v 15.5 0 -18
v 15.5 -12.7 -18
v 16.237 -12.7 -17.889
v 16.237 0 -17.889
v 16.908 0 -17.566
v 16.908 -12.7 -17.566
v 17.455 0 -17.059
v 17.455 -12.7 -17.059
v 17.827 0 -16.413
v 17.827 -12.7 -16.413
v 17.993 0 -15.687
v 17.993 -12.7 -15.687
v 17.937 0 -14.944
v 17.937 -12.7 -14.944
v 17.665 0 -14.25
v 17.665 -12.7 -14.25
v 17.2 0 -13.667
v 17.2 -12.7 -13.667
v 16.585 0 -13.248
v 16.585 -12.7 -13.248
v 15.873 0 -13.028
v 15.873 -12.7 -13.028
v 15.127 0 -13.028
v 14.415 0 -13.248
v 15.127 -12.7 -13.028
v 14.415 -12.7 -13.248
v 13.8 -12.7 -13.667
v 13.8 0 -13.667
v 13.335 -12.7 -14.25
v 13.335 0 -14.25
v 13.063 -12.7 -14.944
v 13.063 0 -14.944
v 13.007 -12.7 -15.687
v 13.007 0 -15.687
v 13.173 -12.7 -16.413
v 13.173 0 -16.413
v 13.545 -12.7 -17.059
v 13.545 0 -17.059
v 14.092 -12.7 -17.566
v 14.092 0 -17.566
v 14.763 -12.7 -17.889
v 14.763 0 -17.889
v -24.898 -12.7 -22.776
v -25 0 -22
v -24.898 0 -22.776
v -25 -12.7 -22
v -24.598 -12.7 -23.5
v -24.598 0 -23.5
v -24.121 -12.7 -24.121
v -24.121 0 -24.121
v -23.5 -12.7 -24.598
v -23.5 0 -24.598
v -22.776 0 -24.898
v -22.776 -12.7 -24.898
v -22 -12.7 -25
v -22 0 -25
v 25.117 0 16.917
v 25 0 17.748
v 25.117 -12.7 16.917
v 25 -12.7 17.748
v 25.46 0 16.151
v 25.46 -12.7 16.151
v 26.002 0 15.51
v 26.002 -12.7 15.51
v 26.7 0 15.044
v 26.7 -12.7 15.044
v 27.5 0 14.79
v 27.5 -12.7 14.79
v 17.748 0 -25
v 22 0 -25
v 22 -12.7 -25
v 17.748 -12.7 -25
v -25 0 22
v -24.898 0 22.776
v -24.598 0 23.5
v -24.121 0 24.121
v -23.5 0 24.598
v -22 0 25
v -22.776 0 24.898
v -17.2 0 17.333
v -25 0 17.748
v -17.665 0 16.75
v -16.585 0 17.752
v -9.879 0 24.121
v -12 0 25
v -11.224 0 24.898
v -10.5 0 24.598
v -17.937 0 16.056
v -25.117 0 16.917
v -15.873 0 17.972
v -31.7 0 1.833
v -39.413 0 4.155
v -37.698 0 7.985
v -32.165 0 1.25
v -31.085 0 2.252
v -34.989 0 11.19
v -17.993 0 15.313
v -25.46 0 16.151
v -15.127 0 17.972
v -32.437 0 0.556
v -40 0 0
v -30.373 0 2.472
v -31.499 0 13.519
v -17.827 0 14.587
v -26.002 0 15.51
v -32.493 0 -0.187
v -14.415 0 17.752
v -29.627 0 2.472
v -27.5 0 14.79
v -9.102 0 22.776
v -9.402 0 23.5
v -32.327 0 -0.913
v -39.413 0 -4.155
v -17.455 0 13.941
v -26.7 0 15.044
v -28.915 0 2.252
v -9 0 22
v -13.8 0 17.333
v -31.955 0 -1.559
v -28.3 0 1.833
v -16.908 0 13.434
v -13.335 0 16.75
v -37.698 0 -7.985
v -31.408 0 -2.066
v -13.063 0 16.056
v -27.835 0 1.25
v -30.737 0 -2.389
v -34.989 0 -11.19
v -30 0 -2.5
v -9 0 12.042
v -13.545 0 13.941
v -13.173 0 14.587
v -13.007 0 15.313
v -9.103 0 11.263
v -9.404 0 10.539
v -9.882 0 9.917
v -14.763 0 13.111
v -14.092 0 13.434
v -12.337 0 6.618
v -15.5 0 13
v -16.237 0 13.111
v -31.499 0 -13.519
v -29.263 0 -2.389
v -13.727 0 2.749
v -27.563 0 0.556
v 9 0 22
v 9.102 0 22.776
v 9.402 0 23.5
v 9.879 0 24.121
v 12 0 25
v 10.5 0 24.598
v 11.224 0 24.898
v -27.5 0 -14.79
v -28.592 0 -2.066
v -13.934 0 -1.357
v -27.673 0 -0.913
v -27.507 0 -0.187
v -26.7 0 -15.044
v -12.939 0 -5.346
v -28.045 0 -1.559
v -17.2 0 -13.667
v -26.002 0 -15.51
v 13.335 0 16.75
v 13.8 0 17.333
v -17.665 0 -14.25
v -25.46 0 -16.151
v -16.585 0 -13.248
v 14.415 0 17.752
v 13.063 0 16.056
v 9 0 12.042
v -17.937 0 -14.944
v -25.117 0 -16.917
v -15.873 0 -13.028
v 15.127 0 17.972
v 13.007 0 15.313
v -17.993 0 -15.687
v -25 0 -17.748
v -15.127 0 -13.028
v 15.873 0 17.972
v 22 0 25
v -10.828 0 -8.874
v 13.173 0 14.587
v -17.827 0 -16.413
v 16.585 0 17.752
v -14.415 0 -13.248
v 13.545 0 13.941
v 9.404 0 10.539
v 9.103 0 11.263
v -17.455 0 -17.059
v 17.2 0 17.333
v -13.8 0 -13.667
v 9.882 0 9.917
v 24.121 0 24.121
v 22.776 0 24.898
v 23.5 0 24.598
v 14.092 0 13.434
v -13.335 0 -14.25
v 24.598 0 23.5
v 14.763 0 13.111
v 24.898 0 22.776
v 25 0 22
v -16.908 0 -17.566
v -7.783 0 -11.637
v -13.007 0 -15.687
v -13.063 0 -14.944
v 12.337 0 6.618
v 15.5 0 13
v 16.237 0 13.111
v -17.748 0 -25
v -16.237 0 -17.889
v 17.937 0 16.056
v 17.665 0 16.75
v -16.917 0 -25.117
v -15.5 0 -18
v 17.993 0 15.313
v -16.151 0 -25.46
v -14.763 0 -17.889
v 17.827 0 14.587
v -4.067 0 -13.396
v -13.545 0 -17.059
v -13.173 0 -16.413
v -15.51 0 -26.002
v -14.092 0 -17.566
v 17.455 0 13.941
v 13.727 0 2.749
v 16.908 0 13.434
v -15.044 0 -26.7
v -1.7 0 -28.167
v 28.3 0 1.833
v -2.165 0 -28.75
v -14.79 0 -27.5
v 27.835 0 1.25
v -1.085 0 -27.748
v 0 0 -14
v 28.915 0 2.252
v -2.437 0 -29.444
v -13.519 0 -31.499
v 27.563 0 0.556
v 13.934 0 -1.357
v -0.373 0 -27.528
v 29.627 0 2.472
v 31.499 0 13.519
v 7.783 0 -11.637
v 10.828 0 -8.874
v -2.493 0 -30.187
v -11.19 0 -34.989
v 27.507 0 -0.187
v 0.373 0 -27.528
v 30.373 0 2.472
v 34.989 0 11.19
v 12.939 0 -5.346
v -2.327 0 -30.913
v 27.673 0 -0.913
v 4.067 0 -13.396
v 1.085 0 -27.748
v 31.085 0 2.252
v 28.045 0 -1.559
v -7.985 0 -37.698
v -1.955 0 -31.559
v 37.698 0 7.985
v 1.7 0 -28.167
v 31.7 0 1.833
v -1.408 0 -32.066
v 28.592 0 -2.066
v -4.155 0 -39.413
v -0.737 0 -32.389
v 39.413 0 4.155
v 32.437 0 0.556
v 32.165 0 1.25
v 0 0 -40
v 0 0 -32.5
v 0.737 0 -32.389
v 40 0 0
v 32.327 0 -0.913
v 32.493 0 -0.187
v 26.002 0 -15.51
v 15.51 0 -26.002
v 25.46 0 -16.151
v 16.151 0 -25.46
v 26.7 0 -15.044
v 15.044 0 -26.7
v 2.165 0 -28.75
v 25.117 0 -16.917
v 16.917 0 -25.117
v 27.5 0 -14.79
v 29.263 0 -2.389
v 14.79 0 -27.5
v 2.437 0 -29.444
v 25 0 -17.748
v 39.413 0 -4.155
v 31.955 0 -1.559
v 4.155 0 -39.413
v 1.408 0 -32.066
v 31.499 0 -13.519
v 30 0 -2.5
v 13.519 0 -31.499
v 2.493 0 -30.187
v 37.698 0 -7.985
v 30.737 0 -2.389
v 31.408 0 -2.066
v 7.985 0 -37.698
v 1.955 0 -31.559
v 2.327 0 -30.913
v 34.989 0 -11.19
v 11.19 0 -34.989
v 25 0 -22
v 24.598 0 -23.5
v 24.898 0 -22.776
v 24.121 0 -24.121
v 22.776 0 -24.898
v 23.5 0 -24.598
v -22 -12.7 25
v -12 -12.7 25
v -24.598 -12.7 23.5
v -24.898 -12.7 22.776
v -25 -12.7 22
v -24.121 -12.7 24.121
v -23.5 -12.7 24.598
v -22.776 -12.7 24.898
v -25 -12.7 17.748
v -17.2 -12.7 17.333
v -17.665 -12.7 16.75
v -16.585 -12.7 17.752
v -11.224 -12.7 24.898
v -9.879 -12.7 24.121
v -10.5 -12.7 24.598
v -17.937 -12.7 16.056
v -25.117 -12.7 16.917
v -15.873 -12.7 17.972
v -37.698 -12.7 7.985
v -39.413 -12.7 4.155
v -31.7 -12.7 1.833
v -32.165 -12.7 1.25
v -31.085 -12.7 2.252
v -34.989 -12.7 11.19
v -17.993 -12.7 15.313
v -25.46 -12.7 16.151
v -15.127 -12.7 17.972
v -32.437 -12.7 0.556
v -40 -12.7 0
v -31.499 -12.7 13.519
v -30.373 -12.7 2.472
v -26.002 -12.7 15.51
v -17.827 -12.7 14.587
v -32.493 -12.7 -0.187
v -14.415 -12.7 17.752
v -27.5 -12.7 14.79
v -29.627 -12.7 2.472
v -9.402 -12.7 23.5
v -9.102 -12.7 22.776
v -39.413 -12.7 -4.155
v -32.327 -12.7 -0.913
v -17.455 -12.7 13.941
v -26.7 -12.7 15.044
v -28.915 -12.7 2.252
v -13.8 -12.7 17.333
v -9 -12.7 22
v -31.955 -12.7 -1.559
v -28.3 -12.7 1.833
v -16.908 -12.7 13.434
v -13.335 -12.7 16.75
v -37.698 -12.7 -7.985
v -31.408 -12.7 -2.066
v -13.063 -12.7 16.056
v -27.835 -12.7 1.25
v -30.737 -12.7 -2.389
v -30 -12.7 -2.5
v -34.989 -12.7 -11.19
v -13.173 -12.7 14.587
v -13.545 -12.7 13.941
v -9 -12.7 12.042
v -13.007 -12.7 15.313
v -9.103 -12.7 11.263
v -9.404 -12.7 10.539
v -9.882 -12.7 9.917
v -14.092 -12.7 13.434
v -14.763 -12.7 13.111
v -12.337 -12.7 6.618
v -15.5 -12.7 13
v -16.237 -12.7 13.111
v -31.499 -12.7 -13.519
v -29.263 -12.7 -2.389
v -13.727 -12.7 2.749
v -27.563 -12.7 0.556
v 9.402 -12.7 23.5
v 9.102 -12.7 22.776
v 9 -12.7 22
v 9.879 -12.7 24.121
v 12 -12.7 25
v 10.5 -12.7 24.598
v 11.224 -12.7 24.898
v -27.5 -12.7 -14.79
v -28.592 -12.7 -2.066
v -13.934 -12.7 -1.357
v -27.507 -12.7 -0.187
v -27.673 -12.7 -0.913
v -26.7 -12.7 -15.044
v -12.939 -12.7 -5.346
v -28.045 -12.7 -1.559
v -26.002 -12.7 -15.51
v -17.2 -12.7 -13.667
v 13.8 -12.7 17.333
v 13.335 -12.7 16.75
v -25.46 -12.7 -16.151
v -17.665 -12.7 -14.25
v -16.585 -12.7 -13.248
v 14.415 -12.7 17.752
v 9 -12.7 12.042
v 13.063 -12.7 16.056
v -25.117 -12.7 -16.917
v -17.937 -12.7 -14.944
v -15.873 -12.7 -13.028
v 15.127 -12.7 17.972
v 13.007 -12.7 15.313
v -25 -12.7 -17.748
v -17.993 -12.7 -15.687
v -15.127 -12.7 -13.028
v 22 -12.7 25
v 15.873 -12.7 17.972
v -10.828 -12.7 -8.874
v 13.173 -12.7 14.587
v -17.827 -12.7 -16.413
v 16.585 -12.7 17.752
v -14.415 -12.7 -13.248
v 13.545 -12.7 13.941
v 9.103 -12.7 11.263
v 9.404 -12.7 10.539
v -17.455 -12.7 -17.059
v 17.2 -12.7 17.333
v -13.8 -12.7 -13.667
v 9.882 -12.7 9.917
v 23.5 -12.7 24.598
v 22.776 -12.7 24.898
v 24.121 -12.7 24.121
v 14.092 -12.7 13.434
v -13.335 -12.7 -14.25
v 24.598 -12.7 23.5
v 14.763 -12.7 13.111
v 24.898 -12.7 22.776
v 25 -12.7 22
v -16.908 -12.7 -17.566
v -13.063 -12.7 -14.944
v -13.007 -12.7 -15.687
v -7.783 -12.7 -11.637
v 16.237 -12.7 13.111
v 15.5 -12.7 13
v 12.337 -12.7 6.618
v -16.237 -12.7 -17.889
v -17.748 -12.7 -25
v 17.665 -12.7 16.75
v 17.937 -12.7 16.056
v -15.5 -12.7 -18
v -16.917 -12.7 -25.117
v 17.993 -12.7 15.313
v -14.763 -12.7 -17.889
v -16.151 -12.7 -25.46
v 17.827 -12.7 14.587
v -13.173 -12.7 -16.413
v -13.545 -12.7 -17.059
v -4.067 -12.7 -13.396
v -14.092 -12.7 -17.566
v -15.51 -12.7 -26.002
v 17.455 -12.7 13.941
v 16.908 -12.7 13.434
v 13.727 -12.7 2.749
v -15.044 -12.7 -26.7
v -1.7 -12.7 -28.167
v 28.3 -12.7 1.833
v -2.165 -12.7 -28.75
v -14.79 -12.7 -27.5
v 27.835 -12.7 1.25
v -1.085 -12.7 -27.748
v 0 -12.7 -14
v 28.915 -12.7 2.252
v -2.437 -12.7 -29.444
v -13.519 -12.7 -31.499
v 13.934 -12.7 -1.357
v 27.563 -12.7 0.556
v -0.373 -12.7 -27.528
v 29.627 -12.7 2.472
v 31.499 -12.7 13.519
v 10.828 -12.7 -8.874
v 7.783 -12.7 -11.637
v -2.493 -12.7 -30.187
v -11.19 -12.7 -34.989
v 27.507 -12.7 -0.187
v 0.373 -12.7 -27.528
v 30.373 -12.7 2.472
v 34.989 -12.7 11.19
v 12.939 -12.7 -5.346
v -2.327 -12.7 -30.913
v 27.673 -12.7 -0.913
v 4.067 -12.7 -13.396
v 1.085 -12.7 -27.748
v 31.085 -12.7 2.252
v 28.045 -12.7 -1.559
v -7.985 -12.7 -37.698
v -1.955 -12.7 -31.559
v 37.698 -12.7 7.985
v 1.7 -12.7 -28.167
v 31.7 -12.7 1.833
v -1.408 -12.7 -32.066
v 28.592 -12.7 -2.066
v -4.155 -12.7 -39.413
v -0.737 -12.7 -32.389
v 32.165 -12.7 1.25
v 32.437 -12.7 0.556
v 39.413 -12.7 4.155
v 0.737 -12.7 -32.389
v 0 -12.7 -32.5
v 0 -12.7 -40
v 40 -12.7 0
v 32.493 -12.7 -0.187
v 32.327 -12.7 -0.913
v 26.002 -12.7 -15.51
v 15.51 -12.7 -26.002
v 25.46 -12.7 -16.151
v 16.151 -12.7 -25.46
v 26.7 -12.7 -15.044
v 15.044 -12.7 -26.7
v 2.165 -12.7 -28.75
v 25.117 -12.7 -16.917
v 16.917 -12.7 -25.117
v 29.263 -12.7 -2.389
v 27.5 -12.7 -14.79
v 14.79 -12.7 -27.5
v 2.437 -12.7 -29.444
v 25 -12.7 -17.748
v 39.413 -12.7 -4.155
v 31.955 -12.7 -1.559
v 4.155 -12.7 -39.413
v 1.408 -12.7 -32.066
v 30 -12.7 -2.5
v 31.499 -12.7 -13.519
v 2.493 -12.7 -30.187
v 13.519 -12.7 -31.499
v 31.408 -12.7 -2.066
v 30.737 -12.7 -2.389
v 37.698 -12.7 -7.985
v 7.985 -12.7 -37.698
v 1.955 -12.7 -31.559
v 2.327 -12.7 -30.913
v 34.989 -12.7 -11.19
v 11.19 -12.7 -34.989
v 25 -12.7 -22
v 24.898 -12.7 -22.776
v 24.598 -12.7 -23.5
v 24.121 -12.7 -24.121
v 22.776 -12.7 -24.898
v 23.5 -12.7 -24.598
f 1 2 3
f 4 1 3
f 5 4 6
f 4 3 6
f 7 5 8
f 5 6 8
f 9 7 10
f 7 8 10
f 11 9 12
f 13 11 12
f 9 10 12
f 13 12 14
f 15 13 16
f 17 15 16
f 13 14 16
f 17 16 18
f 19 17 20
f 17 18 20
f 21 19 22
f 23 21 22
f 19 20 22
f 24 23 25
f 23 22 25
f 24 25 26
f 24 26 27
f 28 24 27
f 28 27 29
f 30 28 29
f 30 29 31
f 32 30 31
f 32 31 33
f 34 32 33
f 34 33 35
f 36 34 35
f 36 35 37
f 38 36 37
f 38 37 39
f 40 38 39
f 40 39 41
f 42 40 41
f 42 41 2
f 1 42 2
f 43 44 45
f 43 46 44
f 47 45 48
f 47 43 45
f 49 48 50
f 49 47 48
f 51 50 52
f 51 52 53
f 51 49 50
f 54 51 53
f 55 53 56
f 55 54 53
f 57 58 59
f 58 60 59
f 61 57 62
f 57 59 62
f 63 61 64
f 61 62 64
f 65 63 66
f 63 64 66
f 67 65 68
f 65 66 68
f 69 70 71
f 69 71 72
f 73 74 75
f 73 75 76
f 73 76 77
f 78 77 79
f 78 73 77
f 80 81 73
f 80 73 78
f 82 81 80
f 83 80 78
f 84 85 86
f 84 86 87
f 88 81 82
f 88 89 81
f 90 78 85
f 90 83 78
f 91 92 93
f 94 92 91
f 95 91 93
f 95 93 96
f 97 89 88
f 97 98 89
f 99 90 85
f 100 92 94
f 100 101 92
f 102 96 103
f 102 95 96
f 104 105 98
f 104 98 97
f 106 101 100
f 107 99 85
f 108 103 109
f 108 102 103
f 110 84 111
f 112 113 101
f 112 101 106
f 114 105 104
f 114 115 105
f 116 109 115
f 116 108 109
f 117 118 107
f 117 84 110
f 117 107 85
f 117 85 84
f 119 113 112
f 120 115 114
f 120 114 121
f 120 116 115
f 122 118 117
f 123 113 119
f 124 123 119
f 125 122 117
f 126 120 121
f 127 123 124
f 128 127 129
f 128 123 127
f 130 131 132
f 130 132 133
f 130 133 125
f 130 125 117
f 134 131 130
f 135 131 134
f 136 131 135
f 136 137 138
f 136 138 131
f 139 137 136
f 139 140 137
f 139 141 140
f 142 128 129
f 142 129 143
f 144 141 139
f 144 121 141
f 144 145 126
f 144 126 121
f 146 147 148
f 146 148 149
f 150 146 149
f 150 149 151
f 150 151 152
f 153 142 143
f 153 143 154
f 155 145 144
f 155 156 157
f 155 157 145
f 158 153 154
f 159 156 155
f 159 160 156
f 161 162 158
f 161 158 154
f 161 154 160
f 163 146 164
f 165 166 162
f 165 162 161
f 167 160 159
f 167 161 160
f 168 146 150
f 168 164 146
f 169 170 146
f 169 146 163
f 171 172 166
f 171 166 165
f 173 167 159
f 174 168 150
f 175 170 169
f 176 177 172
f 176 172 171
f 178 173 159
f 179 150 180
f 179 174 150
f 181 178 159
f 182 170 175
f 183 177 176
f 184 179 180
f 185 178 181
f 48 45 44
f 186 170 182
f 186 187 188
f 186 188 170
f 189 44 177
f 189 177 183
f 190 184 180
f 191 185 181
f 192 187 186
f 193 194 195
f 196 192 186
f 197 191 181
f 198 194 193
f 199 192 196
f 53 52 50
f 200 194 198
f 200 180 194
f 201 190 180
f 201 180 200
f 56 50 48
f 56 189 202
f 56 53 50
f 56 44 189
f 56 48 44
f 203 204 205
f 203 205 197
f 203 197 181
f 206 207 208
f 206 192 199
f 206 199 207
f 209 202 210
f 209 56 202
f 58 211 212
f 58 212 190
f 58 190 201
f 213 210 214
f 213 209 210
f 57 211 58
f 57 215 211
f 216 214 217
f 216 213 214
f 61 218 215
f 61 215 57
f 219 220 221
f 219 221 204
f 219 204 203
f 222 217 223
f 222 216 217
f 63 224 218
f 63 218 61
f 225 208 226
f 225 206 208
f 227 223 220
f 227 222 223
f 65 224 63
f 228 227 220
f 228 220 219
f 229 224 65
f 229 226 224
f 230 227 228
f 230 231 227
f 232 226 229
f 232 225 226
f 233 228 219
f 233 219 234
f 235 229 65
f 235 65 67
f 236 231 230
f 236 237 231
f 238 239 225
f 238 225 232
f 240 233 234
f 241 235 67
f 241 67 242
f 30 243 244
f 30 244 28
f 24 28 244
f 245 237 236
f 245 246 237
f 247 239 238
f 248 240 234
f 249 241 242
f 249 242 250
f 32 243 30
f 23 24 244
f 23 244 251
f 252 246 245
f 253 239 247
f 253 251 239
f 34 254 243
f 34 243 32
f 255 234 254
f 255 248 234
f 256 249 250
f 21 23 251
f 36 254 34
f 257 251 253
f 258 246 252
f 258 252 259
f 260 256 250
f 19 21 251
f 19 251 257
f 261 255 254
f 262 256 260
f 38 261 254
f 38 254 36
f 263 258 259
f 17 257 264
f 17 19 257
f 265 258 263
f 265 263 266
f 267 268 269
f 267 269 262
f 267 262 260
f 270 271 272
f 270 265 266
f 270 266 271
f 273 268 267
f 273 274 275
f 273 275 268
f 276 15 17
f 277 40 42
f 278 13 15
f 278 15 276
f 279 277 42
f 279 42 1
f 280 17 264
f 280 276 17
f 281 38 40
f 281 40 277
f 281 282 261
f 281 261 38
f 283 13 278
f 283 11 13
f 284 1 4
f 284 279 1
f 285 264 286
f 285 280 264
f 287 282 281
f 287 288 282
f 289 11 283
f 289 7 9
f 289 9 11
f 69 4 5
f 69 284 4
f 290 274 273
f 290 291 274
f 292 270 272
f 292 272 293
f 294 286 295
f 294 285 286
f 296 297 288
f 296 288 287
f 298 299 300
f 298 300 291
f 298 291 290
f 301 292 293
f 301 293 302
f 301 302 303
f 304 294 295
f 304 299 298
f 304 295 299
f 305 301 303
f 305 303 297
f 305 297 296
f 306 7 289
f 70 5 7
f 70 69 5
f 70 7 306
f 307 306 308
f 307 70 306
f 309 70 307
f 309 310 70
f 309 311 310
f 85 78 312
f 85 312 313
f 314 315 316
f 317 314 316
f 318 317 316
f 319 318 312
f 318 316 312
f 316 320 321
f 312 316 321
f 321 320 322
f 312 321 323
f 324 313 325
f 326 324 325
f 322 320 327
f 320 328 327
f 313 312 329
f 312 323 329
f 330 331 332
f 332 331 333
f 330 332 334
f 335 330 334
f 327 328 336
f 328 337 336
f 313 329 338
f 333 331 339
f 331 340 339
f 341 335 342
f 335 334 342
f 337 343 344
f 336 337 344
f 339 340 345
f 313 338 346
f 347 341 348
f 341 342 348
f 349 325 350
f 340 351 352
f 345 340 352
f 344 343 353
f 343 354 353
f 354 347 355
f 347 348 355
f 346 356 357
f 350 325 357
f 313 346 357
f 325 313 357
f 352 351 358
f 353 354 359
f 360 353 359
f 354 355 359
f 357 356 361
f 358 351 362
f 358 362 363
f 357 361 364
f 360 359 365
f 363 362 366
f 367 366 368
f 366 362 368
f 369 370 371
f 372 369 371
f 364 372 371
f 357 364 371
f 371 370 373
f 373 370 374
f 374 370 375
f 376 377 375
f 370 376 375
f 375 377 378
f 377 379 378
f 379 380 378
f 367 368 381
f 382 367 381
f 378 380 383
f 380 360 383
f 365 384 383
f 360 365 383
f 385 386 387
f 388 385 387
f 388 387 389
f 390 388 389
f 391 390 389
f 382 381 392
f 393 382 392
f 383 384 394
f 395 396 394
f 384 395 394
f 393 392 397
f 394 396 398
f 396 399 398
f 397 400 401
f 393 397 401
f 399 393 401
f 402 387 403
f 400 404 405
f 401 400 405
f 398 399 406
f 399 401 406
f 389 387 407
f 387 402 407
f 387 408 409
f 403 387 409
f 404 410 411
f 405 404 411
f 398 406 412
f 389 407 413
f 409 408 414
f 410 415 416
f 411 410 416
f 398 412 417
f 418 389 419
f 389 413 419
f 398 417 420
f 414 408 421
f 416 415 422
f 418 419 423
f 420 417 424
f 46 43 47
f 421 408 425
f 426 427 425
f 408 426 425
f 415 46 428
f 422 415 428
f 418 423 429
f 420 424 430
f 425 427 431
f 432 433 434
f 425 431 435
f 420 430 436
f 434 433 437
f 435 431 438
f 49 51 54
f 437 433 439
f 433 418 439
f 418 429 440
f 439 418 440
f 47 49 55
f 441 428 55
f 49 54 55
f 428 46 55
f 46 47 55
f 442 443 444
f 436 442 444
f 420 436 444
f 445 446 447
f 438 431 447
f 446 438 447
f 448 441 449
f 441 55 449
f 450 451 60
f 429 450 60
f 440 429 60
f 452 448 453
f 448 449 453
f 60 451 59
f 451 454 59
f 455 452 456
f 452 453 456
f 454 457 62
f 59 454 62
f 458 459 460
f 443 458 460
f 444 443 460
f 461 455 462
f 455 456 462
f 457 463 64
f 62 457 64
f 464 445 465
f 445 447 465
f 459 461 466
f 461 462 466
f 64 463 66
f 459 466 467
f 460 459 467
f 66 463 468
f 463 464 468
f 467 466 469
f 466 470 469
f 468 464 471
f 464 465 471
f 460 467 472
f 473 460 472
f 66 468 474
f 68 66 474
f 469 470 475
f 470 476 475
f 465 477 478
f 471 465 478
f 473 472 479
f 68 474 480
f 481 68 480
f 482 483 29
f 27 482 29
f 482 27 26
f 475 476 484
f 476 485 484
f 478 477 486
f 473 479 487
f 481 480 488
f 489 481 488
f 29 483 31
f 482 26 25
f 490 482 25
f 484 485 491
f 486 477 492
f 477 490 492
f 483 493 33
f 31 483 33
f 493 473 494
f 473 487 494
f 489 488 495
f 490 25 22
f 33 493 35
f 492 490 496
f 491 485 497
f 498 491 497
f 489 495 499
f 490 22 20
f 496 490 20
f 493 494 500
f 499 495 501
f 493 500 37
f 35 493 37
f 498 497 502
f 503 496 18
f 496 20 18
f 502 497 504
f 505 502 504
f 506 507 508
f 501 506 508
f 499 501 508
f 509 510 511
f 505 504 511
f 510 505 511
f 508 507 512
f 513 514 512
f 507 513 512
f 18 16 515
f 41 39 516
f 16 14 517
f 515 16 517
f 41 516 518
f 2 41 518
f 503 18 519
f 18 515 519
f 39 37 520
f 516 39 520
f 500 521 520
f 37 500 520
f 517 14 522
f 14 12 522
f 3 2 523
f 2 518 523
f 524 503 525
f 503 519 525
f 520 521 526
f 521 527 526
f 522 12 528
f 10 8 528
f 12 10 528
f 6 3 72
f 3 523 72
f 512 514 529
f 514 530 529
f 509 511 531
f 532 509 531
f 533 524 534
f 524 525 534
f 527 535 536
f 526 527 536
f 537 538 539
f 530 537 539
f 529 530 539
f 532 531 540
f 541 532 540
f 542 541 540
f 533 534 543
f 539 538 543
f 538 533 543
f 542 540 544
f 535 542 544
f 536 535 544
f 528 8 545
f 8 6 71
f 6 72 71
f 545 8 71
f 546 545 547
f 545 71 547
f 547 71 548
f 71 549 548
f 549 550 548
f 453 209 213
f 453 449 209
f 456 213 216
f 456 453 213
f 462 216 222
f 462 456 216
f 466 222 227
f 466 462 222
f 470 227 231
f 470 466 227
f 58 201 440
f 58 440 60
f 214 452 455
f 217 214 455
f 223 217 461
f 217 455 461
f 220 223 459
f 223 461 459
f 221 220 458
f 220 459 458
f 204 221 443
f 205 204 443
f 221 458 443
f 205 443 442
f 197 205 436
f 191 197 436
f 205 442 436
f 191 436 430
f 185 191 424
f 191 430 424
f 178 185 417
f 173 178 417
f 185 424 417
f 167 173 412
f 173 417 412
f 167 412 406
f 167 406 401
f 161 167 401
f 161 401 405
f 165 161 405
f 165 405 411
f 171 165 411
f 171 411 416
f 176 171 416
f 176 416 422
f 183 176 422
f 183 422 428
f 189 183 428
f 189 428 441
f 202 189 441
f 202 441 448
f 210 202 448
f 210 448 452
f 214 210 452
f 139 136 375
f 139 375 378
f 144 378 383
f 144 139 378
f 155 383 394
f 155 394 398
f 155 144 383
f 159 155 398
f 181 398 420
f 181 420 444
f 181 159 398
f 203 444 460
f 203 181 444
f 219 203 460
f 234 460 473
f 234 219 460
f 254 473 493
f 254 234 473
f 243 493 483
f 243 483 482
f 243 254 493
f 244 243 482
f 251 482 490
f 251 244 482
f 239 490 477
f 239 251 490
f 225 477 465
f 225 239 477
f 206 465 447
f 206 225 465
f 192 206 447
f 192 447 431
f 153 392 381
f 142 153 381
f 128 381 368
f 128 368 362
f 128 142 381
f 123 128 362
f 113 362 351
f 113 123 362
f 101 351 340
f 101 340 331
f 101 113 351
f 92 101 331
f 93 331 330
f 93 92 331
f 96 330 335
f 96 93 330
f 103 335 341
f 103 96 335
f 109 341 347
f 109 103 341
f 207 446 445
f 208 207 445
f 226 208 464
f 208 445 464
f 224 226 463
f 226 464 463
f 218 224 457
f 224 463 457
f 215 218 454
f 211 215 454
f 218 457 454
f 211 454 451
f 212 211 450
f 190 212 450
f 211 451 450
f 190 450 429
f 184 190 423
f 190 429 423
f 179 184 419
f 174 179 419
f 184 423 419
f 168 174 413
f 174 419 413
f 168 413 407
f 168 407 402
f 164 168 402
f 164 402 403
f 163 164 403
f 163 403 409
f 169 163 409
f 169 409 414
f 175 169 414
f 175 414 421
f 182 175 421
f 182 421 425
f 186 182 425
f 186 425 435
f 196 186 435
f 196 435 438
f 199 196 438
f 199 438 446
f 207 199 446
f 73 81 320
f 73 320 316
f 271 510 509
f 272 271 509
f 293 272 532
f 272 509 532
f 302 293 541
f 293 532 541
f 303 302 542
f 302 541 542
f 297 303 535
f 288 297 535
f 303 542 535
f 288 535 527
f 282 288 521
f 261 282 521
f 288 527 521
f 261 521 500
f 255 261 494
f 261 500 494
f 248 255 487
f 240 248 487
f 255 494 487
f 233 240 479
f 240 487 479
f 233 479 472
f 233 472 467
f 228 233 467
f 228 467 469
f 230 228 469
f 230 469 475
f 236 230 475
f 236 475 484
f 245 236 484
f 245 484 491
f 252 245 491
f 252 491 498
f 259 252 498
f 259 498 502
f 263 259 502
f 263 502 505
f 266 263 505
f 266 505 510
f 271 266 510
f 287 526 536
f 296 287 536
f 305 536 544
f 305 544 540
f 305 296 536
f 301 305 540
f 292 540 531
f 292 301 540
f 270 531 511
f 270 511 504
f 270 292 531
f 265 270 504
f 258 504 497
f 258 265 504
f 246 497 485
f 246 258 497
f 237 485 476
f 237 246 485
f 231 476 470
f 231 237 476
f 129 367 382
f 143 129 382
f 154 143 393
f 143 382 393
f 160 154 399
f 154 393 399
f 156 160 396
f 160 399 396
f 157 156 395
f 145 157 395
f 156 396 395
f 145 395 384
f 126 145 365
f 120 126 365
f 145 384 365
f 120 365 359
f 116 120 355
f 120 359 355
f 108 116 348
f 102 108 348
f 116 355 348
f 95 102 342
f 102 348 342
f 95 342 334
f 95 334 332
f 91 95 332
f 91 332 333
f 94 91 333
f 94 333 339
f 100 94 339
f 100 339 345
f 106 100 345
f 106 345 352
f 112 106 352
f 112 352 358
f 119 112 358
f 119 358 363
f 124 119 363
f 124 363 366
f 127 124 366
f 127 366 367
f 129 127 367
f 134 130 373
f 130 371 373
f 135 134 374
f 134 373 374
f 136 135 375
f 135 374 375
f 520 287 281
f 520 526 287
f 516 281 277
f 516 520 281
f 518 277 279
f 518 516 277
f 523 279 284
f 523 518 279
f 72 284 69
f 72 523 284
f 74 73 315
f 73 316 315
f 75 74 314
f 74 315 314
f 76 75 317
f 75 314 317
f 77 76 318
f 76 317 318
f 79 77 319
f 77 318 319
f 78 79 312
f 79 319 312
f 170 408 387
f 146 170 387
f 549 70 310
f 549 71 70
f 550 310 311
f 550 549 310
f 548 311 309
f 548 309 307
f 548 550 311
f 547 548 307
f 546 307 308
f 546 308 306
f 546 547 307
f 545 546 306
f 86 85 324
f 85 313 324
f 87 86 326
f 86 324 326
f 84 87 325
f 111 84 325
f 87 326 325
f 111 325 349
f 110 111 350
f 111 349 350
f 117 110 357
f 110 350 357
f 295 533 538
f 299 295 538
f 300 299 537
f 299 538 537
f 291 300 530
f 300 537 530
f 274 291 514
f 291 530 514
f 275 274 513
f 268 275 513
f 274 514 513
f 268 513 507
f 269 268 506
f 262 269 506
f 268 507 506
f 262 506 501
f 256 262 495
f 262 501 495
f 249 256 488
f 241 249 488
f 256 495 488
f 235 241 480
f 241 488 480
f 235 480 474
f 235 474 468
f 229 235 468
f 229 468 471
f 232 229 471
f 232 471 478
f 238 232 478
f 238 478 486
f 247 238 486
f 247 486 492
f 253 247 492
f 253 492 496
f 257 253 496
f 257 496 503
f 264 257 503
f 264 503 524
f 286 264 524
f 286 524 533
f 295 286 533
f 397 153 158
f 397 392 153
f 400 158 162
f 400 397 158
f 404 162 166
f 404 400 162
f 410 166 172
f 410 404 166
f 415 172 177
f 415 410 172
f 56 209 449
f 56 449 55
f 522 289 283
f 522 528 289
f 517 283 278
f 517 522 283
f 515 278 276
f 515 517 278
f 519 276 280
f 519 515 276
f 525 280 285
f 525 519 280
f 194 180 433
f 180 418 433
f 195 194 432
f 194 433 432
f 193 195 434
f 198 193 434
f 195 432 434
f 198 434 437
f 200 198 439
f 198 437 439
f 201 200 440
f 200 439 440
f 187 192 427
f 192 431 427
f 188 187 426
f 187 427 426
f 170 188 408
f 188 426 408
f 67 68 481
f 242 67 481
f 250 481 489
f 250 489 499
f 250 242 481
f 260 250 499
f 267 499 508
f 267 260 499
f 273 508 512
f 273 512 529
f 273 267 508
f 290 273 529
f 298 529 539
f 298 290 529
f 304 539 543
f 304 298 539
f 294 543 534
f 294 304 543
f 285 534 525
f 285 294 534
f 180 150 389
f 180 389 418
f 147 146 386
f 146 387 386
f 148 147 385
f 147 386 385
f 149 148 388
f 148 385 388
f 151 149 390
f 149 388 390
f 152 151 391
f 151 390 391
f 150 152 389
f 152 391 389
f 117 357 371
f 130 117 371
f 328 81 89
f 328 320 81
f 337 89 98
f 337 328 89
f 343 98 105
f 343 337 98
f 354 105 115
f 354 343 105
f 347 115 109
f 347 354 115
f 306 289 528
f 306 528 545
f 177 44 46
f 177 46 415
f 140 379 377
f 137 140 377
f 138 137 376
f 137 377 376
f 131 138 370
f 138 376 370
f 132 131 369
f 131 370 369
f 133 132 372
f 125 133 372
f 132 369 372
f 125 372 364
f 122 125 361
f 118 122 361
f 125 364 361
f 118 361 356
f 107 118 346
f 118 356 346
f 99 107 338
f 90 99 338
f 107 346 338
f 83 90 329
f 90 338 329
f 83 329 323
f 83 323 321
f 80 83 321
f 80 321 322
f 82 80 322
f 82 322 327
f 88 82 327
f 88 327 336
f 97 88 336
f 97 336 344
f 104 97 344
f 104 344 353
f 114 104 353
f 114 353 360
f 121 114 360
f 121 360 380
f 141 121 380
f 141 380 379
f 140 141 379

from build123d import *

# Parameters (mm, degrees)
BOSS_EXTRUDE1_DEPTH         = 12.7
TAP_DRILL_FOR_M6X1_0_TAP1_D = 5
FILLET1_R                   = 3


with BuildPart() as part:
    # Sketch1 → Boss-Extrude1 (new body)
    with BuildSketch(Plane(origin=(0, 0, 0), x_dir=(1, 0, 0), z_dir=(0, 1, 0))):
        with BuildLine():
            Line((-25, -15), (-25, -25))
            Line((-25, -25), (-9, -25))
            Line((-9, -25), (-9, -10.723805295))
            ThreePointArc((-9, -10.723805295), (0, 14), (9, -10.723805295))
            Line((9, -10.723805295), (9, -25))
            Line((9, -25), (25, -25))
            Line((25, -25), (25, -15))
            ThreePointArc((25, -15), (40, 0), (25, 15))
            Line((25, 15), (25, 25))
            Line((25, 25), (15, 25))
            ThreePointArc((15, 25), (0, 40), (-15, 25))
            Line((-15, 25), (-25, 25))
            Line((-25, 25), (-25, 15))
            ThreePointArc((-25, 15), (-40, 0), (-25, -15))
        make_face()
    extrude(amount=-BOSS_EXTRUDE1_DEPTH)

    # Tap Drill for M6x1.0 Tap1 (through all)
    with Locations(Plane(origin=(-15.5, 0, 15.5), x_dir=(0, 0, 1), z_dir=(0, 1, 0))):
        with Locations((0, 0), (-31, 0), (-31, 31), (0, 31), (-15.5, -14.5), (-45.5, 15.5), (-15.5, 45.5)):
            Hole(TAP_DRILL_FOR_M6X1_0_TAP1_D / 2)

    # Fillet1
    fillet1_edges = [part.edges().sort_by_distance(p)[0] for p in [
        (-25, -6.35, -15),
        (-25, -6.35, -25),
        (-15, -6.35, -25),
        (15, -6.35, -25),
        (25, -6.35, -25),
        (25, -6.35, -15),
        (25, -6.35, 15),
        (25, -6.35, 25),
        (9, -6.35, 25),
        (9, -6.35, 10.723805295),
        (-9, -6.35, 10.723805295),
        (-9, -6.35, 25),
        (-25, -6.35, 25),
        (-25, -6.35, 15),
    ]]
    fillet(fillet1_edges, radius=FILLET1_R)


solid = part.part
